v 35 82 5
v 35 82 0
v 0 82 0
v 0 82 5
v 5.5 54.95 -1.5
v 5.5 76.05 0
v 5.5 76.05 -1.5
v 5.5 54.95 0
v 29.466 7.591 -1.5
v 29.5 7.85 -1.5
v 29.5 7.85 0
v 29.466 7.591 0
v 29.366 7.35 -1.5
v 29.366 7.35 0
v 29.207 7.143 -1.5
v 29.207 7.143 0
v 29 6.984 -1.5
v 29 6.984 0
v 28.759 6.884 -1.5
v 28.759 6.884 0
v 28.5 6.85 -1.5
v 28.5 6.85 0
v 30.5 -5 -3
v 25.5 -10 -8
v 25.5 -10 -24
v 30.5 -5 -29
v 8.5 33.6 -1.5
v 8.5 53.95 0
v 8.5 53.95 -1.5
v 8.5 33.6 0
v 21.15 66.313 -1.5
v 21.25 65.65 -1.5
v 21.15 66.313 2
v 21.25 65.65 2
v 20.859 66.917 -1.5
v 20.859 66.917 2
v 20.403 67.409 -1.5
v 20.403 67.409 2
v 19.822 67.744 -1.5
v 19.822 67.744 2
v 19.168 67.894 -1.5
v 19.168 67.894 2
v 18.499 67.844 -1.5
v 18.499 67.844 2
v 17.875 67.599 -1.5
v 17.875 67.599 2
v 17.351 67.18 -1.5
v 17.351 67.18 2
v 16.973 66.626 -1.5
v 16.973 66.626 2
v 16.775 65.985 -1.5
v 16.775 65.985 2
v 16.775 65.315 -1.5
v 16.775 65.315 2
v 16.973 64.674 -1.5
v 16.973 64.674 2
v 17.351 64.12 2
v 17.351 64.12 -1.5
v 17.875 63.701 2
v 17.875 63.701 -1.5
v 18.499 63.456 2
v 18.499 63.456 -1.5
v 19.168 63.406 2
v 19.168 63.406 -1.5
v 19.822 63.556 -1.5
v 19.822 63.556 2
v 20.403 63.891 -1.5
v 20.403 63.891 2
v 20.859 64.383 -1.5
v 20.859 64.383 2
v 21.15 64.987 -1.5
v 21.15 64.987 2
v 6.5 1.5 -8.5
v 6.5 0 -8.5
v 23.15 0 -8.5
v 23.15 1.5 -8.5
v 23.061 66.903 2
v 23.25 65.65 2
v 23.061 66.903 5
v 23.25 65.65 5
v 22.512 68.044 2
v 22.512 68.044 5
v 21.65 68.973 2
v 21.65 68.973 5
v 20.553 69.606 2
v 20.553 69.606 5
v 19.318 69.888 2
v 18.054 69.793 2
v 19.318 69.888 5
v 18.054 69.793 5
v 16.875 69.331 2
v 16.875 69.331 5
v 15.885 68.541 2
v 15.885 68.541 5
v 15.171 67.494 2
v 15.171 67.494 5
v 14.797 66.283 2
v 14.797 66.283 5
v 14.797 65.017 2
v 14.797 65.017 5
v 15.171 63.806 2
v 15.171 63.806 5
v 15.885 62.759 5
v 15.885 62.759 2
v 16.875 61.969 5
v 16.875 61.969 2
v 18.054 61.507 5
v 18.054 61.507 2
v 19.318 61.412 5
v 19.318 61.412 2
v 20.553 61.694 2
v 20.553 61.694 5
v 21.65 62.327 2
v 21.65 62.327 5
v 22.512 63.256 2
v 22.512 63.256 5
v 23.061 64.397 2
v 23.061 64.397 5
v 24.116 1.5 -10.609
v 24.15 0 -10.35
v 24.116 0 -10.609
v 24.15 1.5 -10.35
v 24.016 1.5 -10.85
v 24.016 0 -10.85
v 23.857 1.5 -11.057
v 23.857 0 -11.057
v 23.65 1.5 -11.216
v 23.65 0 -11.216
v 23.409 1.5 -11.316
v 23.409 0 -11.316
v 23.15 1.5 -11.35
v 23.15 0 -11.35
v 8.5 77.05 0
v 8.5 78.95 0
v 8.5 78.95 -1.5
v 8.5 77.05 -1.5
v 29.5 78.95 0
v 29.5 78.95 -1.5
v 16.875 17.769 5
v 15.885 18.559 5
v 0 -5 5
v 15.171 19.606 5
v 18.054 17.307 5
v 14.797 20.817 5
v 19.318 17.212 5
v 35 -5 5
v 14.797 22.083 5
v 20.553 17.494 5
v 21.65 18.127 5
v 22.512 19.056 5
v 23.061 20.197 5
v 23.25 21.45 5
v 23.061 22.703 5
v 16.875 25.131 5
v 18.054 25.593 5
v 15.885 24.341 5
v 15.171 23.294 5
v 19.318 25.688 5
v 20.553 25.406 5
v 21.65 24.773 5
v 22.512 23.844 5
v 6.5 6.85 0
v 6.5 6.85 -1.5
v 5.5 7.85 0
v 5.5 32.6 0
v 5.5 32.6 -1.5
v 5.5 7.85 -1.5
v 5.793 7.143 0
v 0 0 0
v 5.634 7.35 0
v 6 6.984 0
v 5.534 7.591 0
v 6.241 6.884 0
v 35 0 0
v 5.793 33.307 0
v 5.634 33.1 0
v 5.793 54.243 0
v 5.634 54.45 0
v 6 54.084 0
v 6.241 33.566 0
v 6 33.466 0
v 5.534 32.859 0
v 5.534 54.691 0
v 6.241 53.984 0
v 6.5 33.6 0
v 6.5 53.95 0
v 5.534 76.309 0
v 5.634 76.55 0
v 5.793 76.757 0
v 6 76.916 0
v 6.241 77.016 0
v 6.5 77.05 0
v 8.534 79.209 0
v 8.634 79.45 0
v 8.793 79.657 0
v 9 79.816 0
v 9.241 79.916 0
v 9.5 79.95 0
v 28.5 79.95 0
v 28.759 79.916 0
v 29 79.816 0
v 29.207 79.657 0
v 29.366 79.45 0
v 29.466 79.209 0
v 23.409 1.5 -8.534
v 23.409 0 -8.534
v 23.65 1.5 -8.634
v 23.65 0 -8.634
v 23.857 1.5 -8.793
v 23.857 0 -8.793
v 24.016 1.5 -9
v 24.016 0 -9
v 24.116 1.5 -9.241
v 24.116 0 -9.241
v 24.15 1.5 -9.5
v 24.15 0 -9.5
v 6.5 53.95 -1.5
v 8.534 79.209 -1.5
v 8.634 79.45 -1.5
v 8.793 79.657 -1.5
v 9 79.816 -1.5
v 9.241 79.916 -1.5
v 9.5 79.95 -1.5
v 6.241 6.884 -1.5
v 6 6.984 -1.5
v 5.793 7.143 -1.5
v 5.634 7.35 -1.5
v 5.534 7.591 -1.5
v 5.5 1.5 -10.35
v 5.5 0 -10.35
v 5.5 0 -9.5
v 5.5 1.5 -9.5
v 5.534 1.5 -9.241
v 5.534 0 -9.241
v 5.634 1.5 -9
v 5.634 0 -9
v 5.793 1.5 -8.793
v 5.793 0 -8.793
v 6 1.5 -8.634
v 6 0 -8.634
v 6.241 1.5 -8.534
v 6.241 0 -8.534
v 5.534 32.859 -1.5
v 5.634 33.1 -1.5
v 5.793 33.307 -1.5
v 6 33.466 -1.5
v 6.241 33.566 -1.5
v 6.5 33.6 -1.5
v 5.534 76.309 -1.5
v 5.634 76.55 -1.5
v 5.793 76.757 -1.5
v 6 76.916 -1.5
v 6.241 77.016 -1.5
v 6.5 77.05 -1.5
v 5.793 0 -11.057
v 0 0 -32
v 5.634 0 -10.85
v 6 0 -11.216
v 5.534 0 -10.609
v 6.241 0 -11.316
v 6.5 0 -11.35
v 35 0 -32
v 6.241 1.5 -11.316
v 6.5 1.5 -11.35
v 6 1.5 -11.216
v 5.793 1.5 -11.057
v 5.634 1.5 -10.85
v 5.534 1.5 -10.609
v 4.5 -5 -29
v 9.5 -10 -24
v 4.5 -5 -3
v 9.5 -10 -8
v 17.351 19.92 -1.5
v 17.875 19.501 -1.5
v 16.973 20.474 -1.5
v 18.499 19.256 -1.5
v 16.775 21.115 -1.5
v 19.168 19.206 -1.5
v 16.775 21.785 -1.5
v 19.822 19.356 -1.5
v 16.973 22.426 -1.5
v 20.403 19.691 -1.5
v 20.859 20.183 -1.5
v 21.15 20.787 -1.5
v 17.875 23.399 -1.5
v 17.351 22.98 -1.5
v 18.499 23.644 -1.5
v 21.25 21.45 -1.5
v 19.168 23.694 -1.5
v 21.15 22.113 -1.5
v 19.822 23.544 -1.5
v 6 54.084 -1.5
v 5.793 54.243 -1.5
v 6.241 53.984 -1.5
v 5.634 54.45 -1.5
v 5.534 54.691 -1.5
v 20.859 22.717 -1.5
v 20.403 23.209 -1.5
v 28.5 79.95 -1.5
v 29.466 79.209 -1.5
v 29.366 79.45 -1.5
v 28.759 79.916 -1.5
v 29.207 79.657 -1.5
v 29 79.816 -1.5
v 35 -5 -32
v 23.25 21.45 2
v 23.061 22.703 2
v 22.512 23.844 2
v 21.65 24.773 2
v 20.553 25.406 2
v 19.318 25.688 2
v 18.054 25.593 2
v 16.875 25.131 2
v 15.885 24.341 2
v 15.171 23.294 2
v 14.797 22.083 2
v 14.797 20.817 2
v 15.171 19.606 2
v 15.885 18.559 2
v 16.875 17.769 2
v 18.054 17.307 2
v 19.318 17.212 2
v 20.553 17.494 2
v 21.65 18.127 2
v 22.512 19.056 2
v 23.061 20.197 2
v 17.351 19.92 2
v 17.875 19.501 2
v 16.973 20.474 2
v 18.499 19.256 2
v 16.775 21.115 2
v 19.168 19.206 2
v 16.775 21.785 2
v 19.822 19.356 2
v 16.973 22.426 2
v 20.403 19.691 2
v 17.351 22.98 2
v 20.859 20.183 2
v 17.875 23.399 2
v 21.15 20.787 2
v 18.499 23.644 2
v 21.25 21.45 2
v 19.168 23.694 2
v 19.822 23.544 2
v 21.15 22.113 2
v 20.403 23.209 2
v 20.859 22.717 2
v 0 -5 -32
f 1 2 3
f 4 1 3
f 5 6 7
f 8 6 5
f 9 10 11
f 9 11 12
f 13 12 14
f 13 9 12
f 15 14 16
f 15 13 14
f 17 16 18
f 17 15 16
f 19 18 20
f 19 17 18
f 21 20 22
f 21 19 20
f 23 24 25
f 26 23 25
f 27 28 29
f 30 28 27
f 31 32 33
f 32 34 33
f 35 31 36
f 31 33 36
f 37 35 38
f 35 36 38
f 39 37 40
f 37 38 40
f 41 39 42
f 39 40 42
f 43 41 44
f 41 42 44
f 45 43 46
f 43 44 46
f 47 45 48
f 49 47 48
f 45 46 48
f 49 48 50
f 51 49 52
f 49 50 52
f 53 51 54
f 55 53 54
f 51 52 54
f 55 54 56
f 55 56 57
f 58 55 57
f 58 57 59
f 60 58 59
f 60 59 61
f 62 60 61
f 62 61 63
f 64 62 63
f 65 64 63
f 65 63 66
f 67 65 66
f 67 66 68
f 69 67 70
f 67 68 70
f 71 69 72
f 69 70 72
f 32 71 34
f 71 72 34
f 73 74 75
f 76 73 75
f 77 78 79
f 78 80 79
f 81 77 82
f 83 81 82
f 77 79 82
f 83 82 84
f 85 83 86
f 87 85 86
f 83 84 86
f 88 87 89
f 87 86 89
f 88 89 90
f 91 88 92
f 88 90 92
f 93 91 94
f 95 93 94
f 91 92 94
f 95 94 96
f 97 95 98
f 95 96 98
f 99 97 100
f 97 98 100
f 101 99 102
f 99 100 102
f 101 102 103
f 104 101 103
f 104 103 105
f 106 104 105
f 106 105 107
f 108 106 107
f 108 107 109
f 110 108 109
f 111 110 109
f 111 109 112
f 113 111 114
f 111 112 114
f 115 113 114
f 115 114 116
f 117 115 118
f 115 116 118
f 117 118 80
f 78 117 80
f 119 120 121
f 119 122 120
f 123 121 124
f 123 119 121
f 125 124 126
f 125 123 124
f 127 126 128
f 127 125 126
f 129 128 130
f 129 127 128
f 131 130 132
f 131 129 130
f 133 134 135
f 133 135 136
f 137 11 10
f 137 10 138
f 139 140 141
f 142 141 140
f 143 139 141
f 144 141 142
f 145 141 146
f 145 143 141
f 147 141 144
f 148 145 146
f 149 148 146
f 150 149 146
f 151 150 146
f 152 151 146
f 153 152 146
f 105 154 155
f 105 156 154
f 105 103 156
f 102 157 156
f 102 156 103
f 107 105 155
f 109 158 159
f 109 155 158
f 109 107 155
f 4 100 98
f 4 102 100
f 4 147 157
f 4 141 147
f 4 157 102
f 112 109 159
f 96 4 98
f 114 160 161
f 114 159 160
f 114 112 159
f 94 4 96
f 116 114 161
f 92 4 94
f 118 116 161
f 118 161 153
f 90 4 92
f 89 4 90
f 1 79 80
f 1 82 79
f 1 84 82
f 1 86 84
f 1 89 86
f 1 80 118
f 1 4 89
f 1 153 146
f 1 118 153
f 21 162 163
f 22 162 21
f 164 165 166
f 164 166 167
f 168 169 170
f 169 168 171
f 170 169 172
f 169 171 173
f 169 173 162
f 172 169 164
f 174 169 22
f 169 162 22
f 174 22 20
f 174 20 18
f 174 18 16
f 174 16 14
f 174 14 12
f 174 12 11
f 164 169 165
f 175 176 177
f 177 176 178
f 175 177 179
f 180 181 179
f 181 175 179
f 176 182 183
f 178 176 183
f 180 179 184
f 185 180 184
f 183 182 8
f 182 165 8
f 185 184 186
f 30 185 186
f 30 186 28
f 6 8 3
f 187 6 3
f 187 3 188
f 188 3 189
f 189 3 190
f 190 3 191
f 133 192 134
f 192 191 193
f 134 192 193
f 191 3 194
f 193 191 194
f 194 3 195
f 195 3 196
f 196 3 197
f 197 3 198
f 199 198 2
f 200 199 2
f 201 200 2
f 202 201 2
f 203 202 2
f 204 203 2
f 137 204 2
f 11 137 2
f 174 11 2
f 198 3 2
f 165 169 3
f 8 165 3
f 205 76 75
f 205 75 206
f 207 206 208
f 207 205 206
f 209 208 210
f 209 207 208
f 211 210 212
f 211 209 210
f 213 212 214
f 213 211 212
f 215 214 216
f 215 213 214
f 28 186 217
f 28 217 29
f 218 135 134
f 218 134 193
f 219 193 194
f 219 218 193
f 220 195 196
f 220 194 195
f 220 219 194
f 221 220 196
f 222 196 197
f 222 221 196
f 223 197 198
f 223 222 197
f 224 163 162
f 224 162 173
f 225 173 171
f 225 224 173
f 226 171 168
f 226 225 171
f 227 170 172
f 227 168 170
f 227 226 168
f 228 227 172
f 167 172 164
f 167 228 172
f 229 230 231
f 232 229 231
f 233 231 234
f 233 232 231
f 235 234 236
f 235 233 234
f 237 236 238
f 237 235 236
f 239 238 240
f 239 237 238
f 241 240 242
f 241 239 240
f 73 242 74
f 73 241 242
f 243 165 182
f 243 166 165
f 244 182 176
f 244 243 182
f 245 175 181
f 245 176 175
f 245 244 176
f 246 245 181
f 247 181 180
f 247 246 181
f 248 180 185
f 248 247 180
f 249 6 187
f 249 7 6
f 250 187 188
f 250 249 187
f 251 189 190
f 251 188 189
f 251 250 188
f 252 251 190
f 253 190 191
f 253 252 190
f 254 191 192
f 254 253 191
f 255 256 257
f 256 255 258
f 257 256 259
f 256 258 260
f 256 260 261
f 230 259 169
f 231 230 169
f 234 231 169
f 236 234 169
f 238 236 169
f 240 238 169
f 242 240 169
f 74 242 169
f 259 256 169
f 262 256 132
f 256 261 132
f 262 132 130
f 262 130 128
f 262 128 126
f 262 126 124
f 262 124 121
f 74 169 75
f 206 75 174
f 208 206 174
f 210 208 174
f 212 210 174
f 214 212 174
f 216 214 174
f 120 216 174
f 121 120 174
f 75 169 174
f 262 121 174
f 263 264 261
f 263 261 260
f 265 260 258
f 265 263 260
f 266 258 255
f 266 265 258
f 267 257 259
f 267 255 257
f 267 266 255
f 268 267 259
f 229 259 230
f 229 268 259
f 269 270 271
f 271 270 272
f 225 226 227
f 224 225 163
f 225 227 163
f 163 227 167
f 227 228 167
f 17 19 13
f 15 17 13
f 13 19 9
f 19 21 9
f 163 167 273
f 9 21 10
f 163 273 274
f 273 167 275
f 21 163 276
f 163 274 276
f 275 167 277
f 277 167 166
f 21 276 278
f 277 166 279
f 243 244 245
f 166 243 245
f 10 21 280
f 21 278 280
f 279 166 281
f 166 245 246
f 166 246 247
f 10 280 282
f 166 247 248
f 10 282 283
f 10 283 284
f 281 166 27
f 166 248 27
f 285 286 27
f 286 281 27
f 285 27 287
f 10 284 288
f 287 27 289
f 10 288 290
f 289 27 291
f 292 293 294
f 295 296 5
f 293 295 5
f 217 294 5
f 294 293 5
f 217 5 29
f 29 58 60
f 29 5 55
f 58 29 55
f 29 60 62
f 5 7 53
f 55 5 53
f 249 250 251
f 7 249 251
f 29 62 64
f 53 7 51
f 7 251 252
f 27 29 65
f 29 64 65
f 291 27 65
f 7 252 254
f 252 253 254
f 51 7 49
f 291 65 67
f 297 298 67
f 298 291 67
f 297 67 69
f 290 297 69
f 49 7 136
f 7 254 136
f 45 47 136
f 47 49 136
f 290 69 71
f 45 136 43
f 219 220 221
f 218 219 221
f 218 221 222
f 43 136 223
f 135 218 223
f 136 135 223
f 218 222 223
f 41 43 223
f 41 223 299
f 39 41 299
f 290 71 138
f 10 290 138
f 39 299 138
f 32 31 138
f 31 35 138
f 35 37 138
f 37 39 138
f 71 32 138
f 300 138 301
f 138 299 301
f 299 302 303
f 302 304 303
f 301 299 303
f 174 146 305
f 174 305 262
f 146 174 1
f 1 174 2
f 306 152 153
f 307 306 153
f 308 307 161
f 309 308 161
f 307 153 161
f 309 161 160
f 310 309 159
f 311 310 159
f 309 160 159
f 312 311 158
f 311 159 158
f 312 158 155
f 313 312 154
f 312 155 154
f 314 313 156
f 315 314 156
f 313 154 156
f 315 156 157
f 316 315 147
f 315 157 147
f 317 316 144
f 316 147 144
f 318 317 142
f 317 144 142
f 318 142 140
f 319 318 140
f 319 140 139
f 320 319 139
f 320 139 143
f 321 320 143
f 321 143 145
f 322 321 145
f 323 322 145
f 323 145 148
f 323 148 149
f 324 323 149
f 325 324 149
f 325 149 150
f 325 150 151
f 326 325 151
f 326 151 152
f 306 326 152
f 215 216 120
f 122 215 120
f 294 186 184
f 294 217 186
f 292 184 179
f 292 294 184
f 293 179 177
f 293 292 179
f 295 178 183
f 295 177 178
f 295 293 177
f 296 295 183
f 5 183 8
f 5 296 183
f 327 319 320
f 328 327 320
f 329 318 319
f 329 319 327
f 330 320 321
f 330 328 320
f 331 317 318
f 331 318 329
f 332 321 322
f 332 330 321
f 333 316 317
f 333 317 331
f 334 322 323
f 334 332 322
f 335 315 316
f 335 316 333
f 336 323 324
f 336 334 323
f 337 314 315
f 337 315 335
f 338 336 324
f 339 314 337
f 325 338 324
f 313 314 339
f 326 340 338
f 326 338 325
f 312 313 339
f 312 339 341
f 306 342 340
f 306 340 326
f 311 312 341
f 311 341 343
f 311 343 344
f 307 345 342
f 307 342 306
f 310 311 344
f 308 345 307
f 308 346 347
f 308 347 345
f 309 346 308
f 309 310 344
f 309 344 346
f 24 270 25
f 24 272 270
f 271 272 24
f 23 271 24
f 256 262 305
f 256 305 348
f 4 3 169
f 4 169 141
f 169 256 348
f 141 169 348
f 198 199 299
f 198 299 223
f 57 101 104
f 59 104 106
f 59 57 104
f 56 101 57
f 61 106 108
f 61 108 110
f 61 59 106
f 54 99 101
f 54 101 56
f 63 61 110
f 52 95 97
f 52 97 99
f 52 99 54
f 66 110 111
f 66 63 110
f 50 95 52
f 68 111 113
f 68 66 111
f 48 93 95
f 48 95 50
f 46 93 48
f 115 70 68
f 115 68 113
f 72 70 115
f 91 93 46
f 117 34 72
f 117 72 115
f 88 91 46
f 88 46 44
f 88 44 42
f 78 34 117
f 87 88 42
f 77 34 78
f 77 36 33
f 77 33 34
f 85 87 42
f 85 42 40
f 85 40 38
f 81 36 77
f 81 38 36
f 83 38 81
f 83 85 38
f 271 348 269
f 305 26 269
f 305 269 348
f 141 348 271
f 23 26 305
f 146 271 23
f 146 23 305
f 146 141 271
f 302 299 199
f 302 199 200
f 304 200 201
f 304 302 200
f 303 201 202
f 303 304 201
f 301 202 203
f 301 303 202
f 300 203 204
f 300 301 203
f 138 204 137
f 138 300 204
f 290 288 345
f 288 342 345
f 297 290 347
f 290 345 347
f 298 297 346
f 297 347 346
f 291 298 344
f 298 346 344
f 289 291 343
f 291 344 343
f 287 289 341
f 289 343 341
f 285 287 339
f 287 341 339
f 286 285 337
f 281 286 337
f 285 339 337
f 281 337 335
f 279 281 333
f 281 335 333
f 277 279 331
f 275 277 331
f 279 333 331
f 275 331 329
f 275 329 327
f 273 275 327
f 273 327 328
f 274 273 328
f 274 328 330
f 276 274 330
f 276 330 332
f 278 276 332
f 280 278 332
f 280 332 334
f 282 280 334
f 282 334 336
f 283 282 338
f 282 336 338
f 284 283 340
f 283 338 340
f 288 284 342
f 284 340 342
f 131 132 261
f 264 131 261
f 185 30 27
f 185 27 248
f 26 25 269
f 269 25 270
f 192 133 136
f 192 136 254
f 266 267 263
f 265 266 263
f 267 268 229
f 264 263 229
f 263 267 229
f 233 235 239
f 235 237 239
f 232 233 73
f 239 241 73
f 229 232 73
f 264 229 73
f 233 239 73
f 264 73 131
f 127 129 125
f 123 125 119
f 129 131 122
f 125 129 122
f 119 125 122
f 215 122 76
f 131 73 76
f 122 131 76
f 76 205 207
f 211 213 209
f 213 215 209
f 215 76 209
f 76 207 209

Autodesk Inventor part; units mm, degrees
ref_plane "YZ Plane" through (0, 0, 0) normal (1, 0, 0) x (0, 1, 0)
ref_plane "XZ Plane" through (0, 0, 0) normal (0, 1, 0) x (-1, 0, 0)
ref_plane "XY Plane" through (0, 0, 0) normal (0, 0, 1) x (1, 0, 0)
sketch "Sketch1" plane through (0, 0, 0) normal (0, 0, 1) x (1, 0, 0)
  line L0 (0, 0) -> (35, 0)
  line L1 (35, 0) -> (35, 82)
  line L2 (35, 82) -> (0, 82)
  line L3 (0, 82) -> (0, 0)
  line L4 (8.5, 79.95) -> (8.5, 77.05)
  line L5 (8.5, 77.05) -> (5.5, 77.05)
  line L6 (5.5, 77.05) -> (5.5, 53.95)
  line L7 (5.5, 33.6) -> (5.5, 6.85)
  line L8 (5.5, 6.85) -> (29.5, 6.85)
  line L9 (29.5, 6.85) -> (29.5, 79.95)
  line L10 (29.5, 79.95) -> (8.5, 79.95)
  line L11 (5.5, 53.95) -> (8.5, 53.95)
  line L12 (8.5, 53.95) -> (8.5, 33.6)
  line L13 (8.5, 33.6) -> (5.5, 33.6)
  circle A0 centre (19, 65.65) radius 2.25
  circle A1 centre (19, 21.45) radius 2.25
  dimension "d0" = 35
  dimension "d1" = 82
  dimension "d2" = 21
  dimension "d3" = 24
  dimension "d4" = 21
  dimension "d5" = 26.75
  dimension "d6" = 23.1
  dimension "d7" = 26
  dimension "d8" = 6.85
  dimension "d9" = 5.5
  dimension "d10" = 20.35
  dimension "d15" = 4.5
  dimension "d16" = 4.5
  dimension "d17" = 44.2
  dimension "d18" = 10.5
  dimension "d19" = 14.3
  dimension "d20" = 10.5
extrude "Extrusion1" add sketch "Sketch1" against normal blind 1.5 contours L10 L9 L8 L7 L13 L12 L11 L6 L5 L4 | A0 | A1
extrude "Extrusion3" add sketch "Sketch1" along normal blind 5 contours L3 L2 L1 L0 | L10 L9 L8 L7 L13 L12 L11 L6 L5 L4
sketch "Sketch2" plane through (0, 0, 5) normal (0, 0, 1) x (1, 0, 0)
  circle A0 centre (19, 21.45) radius 4.25
  circle A1 centre (19, 65.65) radius 4.25
  point P0 (0, 0)
  dimension "d23" = 8.5
  dimension "d24" = 8.5
extrude "Extrusion4" cut sketch "Sketch2" against normal blind 3
sketch "Sketch3" plane through (0, 0, 0) normal (0, -1, 0) x (1, 0, 0)
  line L0 (0, 5) -> (35, 5) projected
  line L1 (0, 0) -> (0, 5) projected
  line L2 (35, 0) -> (35, 5) projected
  line L3 (0, 5) -> (35, 5)
  line L4 (35, 5) -> (35, -32)
  line L5 (35, -32) -> (0, -32)
  line L6 (0, -32) -> (0, 5)
  line L7 (0, 0) -> (35, 0) projected
  line L8 (5.5, 0) -> (5.5, -1.5) projected
  line L9 (5.5, -8.5) -> (24.15, -8.5)
  line L10 (24.15, -8.5) -> (24.15, -11.35)
  line L11 (24.15, -11.35) -> (5.5, -11.35)
  line L12 (5.5, -11.35) -> (5.5, -8.5)
  dimension "d27" = 32
  dimension "d28" = 8.5
  dimension "d29" = 2.85
  dimension "d30" = 18.65
extrude "Extrusion5" add sketch "Sketch3" along normal blind 5 contours L0 L2 L7 L1 | L7 L4 L5 L6 | L9 L10 L11 L12
extrude "Extrusion6" add sketch "Sketch3" against normal blind 1.5 contours L9 L10 L11 L12
fillet "Fillet1" radius 1 1 edges at (29.5, 79.95, -0.75)
fillet "Fillet2" radius 1 1 edges at (8.5, 79.95, -0.75)
fillet "Fillet3" radius 1 1 edges at (5.5, 77.05, -0.75)
fillet "Fillet4" radius 1 1 edges at (5.5, 53.95, -0.75)
fillet "Fillet5" radius 1 1 edges at (5.5, 33.6, -0.75)
fillet "Fillet6" radius 1 1 edges at (5.5, 6.85, -0.75)
fillet "Fillet7" radius 1 1 edges at (29.5, 6.85, -0.75)
fillet "Fillet8" radius 1 1 edges at (5.5, 0.75, -11.35)
fillet "Fillet9" radius 1 3 edges at (24.15, 0.75, -11.35) (24.15, 0.75, -8.5) (5.5, 0.75, -8.5)
extrude "Extrusion7" cut sketch "Sketch1" against normal up to next contours A0 | A1
sketch "Sketch4" plane through (0, -5, 0) normal (0, -1, 0) x (1, 0, 0)
  line L0 (25.5, -24) -> (9.5, -24)
  line L1 (9.5, -24) -> (9.5, -8)
  line L2 (9.5, -8) -> (25.5, -8)
  line L3 (25.5, -8) -> (25.5, -24)
  line L4 (0, 5) -> (0, -32) projected
  line L5 (0, -32) -> (35, -32) projected
  point P0 (0, 0)
  dimension "d46" = 16
  dimension "d47" = 16
  dimension "d48" = 9.5
  dimension "d49" = 8
extrude "Extrusion8" add sketch "Sketch4" along normal blind 5
chamfer "Chamfer1" distance 5 angle 45 4 edges at (9.5, -5, -16) (17.5, -5, -24) (25.5, -5, -16) (17.5, -5, -8)
properties part number "keithley_2000_front_feet"
